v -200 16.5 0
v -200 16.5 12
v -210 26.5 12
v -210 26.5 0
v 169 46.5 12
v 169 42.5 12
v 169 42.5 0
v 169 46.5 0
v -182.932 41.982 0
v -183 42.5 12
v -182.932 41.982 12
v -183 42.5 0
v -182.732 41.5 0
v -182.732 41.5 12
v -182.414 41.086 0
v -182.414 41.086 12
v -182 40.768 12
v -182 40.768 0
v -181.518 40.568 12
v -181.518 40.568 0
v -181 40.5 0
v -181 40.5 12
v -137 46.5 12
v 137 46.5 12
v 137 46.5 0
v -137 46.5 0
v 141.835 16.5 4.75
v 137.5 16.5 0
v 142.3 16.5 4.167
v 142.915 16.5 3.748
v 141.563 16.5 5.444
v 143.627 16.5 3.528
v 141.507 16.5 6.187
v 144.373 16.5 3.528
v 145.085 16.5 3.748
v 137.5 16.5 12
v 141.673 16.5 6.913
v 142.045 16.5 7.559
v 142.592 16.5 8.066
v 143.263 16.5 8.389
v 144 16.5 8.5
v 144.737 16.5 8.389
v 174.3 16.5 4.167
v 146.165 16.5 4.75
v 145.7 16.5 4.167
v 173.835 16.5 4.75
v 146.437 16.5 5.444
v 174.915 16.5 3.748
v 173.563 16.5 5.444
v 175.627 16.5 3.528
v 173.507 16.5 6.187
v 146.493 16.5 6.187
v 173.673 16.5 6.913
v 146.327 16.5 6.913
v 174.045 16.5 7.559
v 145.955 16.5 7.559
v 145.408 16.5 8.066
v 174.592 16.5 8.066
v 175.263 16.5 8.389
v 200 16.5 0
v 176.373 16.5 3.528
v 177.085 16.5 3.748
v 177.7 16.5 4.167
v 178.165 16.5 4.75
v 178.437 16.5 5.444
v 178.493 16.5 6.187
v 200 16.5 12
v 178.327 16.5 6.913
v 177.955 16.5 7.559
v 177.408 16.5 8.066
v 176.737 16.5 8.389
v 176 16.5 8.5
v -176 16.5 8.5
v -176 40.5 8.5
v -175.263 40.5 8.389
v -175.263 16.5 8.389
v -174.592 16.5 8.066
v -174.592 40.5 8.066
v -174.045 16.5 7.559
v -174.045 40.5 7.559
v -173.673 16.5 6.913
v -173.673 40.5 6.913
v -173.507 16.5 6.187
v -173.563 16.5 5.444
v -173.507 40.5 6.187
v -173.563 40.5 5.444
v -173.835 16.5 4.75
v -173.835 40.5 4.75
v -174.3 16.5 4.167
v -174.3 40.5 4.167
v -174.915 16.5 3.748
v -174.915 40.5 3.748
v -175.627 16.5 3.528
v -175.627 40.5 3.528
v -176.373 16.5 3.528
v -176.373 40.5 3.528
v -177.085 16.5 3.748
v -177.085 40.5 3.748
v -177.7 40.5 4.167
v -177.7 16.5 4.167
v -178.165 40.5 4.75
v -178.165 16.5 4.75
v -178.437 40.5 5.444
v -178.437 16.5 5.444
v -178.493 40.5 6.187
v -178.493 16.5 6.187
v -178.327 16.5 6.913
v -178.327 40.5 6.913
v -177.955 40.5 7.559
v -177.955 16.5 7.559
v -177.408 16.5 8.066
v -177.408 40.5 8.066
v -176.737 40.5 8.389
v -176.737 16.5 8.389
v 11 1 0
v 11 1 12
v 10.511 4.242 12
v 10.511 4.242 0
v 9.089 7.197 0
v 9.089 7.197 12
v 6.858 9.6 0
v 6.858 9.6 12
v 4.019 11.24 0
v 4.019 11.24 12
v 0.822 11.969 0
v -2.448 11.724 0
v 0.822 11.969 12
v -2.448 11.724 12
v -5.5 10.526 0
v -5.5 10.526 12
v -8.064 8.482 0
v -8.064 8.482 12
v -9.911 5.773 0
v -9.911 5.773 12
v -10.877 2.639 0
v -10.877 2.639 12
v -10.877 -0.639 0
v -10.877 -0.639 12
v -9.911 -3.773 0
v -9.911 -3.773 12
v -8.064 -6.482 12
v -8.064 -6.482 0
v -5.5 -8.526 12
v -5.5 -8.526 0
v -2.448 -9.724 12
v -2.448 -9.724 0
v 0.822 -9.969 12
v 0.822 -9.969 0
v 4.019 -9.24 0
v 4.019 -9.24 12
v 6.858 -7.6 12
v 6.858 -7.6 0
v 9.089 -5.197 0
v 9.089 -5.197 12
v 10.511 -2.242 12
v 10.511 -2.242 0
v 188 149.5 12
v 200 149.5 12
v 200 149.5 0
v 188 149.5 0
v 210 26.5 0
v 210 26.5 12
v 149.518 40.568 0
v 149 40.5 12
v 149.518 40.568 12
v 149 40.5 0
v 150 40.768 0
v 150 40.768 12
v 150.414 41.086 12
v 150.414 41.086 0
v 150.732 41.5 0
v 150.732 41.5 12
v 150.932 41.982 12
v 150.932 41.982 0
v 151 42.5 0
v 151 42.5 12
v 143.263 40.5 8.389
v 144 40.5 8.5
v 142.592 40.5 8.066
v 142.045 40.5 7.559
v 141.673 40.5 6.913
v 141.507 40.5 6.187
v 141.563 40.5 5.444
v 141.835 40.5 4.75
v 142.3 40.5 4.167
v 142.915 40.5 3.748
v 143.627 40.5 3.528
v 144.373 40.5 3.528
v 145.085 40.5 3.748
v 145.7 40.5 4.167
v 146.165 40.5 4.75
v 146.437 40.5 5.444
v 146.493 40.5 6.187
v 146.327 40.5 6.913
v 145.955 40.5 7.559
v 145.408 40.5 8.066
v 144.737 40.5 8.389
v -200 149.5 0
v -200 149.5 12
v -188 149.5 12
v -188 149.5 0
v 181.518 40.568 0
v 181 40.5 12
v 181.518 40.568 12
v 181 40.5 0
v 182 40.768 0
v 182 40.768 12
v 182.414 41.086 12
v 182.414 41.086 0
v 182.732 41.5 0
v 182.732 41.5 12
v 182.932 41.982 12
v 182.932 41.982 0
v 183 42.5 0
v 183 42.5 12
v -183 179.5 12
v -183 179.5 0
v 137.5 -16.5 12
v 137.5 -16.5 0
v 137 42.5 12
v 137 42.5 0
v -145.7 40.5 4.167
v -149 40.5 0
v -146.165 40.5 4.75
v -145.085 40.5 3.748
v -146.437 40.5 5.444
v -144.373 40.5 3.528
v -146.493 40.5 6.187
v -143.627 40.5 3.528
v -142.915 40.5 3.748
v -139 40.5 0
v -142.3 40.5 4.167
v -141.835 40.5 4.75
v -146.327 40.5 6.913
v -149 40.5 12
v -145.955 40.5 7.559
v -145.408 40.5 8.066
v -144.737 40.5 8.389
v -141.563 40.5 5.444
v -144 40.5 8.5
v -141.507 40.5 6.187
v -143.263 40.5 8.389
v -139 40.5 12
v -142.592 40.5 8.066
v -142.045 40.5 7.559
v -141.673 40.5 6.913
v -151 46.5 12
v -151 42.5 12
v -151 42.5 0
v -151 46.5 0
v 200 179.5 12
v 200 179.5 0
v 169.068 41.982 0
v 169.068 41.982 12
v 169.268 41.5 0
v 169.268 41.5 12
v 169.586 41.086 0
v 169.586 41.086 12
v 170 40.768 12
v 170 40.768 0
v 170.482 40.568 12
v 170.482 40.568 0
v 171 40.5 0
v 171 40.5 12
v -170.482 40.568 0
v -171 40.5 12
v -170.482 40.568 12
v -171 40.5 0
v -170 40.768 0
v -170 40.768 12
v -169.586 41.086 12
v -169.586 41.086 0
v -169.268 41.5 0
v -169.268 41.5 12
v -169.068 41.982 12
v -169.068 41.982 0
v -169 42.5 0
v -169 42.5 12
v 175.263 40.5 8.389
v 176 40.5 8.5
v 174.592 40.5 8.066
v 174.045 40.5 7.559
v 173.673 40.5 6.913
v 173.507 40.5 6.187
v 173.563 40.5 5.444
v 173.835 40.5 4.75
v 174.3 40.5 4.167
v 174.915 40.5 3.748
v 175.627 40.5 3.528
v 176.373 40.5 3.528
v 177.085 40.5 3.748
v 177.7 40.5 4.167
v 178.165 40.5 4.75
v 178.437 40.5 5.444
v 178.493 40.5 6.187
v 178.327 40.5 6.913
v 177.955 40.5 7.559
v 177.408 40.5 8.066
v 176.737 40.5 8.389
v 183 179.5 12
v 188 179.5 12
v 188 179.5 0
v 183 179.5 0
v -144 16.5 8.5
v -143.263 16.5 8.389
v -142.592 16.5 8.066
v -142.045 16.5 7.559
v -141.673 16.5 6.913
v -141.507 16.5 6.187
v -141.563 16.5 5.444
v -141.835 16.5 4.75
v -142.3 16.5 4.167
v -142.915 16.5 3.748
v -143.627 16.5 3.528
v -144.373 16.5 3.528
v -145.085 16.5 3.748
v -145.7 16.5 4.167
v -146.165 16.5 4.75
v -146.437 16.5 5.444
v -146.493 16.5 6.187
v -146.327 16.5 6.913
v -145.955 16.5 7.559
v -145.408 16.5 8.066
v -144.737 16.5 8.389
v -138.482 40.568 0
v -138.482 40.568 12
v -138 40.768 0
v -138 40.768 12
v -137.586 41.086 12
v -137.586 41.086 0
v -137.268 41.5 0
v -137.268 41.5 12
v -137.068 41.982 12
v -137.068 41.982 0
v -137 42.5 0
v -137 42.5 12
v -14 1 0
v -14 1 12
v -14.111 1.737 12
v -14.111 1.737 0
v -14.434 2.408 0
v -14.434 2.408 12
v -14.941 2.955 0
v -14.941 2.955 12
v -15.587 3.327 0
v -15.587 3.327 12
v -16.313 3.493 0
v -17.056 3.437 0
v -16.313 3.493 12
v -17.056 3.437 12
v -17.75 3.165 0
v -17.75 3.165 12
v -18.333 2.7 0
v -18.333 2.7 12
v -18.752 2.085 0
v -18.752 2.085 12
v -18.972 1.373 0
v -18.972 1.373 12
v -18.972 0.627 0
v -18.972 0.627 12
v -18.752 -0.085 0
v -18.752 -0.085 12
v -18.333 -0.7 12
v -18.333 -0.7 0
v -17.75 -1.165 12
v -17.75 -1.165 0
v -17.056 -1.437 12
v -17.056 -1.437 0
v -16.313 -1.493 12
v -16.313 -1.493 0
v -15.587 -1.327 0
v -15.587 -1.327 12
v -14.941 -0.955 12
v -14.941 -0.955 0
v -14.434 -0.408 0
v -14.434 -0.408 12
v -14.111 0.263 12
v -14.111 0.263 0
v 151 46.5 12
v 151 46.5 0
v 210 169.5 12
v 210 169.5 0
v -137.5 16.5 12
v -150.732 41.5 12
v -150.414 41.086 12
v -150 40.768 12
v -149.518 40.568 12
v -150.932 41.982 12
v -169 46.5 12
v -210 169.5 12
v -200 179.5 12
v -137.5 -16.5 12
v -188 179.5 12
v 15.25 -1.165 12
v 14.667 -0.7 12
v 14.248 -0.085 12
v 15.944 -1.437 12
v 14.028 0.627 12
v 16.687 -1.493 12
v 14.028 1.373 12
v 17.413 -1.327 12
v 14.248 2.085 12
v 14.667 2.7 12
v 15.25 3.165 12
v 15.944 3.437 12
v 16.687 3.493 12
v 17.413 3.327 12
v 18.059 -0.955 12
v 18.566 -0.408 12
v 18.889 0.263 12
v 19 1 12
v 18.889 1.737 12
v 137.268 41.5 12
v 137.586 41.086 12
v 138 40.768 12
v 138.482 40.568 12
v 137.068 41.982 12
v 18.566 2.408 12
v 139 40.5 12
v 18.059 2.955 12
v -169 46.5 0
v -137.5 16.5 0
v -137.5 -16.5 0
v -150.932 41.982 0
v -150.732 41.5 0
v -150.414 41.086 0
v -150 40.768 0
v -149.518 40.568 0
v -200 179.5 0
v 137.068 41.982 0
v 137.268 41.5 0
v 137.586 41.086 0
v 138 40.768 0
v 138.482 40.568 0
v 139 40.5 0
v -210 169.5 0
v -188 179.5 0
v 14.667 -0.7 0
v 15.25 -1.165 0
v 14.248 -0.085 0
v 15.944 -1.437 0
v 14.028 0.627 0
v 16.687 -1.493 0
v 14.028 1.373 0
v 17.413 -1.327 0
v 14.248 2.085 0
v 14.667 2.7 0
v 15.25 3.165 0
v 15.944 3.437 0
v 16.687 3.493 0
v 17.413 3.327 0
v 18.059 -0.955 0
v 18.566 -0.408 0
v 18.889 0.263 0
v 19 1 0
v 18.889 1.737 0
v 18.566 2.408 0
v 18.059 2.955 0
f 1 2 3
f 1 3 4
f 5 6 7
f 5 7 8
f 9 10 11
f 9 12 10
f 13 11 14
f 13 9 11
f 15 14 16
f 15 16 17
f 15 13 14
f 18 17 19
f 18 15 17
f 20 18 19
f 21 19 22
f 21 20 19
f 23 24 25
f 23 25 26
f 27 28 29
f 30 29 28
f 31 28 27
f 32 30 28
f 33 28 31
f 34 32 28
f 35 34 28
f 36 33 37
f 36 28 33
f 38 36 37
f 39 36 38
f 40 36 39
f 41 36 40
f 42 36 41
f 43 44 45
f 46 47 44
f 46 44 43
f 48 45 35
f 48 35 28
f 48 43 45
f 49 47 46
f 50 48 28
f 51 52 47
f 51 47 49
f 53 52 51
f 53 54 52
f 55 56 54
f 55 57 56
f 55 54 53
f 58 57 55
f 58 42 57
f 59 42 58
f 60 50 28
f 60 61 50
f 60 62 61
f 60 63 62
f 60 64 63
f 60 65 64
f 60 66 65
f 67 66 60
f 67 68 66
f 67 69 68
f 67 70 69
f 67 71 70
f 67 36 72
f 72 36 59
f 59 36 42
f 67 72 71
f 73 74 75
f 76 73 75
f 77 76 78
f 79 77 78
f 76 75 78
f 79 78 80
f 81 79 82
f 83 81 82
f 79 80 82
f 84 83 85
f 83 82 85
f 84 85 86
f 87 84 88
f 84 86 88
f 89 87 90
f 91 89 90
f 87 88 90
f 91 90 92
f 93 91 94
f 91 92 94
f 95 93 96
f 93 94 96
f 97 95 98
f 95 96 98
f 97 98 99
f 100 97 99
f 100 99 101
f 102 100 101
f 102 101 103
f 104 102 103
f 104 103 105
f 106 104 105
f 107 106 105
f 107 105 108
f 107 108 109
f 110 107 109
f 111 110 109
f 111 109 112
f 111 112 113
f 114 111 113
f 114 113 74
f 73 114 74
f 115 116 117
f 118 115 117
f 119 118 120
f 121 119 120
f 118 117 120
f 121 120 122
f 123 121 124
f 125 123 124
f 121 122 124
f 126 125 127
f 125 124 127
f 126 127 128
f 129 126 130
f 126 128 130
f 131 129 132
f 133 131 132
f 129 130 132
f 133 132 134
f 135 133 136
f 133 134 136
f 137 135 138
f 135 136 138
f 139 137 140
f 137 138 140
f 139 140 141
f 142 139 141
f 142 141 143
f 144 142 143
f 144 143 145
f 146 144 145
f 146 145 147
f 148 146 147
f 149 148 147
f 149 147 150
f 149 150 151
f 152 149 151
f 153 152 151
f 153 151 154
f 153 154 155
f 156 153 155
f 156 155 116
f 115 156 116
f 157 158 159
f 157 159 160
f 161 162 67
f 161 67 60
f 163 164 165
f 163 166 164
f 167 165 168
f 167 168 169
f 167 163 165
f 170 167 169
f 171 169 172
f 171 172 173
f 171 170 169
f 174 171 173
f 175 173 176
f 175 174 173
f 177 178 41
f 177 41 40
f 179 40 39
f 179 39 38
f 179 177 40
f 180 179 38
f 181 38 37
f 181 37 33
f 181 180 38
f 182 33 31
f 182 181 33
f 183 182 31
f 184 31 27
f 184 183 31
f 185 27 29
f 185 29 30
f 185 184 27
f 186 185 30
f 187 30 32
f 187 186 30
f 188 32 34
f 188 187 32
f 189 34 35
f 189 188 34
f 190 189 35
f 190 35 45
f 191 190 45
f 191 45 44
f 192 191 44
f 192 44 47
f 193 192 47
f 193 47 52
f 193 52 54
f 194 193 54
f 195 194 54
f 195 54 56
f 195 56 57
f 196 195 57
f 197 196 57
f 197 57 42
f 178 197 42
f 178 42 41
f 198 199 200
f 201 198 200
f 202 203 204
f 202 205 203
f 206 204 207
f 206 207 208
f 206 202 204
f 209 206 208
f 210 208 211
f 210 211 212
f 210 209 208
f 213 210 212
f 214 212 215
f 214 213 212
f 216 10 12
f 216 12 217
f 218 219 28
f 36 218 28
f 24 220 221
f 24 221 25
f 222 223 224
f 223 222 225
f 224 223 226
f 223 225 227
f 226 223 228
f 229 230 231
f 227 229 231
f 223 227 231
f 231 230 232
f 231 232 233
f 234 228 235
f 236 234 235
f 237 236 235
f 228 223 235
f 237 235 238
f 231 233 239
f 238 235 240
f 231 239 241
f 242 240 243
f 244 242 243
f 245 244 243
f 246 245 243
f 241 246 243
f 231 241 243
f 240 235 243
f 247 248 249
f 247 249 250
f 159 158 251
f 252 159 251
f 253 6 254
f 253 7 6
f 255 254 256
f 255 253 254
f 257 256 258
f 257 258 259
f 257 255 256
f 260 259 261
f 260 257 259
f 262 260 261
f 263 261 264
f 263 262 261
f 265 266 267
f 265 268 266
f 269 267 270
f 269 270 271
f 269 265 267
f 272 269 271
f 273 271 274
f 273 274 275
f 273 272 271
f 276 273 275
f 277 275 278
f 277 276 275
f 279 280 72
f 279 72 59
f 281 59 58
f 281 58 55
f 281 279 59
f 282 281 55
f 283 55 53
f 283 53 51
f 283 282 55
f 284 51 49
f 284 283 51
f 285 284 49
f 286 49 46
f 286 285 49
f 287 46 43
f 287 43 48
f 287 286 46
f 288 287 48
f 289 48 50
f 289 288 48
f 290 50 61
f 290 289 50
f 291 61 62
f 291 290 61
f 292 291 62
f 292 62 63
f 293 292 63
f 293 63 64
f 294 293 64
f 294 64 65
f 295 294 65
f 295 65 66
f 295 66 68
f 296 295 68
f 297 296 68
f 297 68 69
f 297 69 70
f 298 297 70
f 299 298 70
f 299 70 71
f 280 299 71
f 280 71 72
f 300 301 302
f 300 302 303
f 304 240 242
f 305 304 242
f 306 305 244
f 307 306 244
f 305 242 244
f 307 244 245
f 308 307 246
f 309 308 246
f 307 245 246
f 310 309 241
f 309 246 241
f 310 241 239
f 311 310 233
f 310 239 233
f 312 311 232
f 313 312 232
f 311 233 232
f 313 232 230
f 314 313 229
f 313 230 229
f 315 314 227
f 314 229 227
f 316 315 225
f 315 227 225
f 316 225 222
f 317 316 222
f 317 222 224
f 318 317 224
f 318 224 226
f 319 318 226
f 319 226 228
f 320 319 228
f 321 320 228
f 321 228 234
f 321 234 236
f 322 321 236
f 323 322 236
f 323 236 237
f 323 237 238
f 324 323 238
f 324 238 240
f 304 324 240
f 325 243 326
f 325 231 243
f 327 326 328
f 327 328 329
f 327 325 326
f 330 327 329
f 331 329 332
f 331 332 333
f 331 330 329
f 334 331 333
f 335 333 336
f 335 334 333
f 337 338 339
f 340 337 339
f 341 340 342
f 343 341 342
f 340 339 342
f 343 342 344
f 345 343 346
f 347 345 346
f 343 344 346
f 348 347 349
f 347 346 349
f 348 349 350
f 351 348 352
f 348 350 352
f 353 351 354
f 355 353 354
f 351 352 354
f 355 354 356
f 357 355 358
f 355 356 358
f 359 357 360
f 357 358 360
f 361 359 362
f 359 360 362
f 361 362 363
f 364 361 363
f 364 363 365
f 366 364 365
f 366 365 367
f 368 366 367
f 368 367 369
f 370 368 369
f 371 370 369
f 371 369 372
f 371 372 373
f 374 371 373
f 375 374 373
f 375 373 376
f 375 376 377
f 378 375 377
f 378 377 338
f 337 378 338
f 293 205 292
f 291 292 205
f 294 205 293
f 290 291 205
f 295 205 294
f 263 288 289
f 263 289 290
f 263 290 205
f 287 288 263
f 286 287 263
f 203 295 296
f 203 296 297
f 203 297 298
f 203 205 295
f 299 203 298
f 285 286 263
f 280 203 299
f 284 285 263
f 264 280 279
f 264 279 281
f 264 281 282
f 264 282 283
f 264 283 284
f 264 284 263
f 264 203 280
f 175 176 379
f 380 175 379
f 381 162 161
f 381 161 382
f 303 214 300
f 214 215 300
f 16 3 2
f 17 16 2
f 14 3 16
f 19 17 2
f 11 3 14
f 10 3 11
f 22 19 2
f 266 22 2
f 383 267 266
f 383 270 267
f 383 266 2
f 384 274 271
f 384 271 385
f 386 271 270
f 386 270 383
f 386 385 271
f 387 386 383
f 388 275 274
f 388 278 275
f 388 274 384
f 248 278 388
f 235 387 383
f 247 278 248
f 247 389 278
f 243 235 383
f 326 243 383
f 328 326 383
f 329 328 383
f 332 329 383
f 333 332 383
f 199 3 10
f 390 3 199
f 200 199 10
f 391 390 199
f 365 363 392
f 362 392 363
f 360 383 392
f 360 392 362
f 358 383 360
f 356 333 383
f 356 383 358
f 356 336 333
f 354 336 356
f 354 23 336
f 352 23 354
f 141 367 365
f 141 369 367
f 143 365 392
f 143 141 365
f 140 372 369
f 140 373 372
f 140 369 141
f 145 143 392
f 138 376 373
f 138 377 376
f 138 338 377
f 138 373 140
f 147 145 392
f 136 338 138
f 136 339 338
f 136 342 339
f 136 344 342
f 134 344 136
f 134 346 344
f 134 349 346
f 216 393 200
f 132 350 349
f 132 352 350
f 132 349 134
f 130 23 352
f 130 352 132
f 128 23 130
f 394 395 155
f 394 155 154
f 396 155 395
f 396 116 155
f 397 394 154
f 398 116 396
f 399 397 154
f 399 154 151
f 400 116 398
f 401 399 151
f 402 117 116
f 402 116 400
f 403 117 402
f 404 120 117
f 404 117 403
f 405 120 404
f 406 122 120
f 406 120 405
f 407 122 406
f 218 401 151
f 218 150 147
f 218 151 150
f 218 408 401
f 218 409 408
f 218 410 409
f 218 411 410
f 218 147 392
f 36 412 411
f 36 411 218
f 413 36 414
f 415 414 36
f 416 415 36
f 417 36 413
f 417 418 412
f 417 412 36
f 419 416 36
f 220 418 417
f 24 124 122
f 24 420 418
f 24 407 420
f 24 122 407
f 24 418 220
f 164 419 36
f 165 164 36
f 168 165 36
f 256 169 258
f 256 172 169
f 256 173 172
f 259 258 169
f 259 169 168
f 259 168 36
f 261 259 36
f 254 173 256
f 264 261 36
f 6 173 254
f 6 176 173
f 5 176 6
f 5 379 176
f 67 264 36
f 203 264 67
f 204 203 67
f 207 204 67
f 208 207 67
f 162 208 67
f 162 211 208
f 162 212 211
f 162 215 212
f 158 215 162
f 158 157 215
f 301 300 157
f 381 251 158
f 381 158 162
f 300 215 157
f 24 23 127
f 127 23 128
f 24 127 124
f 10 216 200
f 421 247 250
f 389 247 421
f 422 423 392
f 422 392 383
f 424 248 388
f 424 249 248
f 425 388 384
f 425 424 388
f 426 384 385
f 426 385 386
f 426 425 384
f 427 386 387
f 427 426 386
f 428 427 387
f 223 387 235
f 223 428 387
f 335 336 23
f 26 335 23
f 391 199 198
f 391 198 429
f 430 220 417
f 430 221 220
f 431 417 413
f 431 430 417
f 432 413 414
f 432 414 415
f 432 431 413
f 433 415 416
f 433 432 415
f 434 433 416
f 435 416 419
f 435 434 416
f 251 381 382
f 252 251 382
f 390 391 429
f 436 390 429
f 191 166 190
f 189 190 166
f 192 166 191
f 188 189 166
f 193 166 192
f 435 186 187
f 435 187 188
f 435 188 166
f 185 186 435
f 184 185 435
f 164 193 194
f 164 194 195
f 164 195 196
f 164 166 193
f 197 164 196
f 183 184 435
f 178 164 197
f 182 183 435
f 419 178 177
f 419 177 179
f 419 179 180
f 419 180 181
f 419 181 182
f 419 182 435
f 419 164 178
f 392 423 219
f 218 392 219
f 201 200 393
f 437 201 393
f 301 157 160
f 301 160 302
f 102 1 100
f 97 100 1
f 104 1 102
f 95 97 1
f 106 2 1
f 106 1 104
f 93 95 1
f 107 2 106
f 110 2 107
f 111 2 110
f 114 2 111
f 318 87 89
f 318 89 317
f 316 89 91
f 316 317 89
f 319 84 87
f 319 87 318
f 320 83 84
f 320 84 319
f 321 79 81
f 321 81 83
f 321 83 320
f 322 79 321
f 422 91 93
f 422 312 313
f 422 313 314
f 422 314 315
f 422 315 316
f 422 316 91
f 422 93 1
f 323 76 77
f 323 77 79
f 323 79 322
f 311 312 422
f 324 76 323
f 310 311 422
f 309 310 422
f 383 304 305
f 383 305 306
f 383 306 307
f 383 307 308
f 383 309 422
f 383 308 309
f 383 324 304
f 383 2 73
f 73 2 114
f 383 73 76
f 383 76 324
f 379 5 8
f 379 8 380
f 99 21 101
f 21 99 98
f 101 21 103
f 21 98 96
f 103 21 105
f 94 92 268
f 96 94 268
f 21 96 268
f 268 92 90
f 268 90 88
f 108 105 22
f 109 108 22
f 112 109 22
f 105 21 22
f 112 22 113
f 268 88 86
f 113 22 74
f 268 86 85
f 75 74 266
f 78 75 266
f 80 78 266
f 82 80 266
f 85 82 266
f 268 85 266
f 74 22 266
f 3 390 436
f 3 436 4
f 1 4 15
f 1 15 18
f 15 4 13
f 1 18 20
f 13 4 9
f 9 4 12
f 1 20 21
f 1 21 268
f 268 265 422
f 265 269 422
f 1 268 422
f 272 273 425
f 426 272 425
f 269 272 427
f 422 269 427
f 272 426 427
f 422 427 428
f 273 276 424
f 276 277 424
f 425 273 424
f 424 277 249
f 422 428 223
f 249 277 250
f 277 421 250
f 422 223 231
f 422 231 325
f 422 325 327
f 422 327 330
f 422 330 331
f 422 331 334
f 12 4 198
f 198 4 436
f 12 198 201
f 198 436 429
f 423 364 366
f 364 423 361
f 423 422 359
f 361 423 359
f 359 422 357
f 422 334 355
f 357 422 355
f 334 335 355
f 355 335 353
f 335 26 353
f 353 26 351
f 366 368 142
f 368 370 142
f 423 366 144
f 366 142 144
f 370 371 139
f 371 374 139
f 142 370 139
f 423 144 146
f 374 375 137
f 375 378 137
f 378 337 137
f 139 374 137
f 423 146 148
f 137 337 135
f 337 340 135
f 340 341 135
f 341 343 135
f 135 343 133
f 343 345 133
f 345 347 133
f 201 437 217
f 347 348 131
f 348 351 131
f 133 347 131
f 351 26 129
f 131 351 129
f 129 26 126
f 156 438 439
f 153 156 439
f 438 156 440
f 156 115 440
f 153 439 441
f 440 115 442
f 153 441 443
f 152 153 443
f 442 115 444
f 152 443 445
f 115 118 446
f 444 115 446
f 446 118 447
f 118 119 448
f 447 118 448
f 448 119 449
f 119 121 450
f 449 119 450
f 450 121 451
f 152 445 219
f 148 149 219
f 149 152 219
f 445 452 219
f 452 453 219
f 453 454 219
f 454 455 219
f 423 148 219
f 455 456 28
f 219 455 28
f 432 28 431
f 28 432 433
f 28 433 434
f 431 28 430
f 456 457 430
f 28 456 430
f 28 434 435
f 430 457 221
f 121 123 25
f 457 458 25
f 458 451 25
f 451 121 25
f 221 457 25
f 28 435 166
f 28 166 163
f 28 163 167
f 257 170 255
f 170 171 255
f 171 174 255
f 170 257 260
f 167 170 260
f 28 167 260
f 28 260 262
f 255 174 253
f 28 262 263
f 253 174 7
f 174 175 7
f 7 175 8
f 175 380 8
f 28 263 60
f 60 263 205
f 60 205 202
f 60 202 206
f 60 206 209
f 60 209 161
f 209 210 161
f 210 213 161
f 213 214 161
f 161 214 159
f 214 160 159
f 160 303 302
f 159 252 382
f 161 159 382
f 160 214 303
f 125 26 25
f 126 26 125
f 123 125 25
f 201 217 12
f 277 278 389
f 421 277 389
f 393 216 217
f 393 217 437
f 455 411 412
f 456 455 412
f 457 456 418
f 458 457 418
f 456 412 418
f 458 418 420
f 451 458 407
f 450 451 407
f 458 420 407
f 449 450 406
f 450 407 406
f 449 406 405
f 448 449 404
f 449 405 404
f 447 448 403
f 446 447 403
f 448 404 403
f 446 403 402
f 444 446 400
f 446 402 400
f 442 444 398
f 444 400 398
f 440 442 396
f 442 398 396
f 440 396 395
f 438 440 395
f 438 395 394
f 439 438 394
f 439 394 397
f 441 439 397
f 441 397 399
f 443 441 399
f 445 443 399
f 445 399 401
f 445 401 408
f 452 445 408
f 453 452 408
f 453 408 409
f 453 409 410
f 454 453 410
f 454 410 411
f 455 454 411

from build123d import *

# Parameters (mm, degrees)
SKETCH1_W            = 275
SKETCH1_H            = 33
BOSS_EXTRUDE1_DEPTH  = 12
CUT_EXTRUDE1_REACH   = 141.005
SKETCH2_R            = 11
SKETCH2_R_2          = 2.5
BOSS_EXTRUDE2_DEPTH  = 12
CUT_EXTRUDE2_REACH   = 250.863
SKETCH4_R            = 2.5
CUT_EXTRUDE3_REACH   = 278.522
SKETCH5_W            = 14
SKETCH5_H            = 6
FILLET1_R            = 2
FILLET1_OF_MIRROR2_R = 2
CHAMFER1_SIZE        = 10
CUT_EXTRUDE4_REACH   = 278.522
SKETCH6_W            = 12
SKETCH6_H            = 30
CHAMFER2_SIZE        = 10


with BuildPart() as part:
    # Sketch1 → Boss-Extrude1 (new body)
    with BuildSketch(Plane.XY):
        Rectangle(SKETCH1_W, SKETCH1_H)
    extrude(amount=BOSS_EXTRUDE1_DEPTH)

    # Sketch2 → Cut-Extrude1 (cut, up to next)
    with BuildSketch(Plane.XY.offset(12), mode=Mode.PRIVATE) as cut_extrude1_sk1:
        with Locations((0, 1)):
            Circle(SKETCH2_R)
    cut_extrude1_tool1 = extrude(cut_extrude1_sk1.sketch, amount=-CUT_EXTRUDE1_REACH, mode=Mode.PRIVATE) & part.part
    # Sketch2 → Cut-Extrude1 (cut, up to next)
    with BuildSketch(Plane.XY.offset(12), mode=Mode.PRIVATE) as cut_extrude1_sk2:
        with Locations((-16.5, 1)):
            Circle(SKETCH2_R_2)
    cut_extrude1_tool2 = extrude(cut_extrude1_sk2.sketch, amount=-CUT_EXTRUDE1_REACH, mode=Mode.PRIVATE) & part.part
    # Sketch2 → Cut-Extrude1 (cut, up to next)
    with BuildSketch(Plane.XY.offset(12), mode=Mode.PRIVATE) as cut_extrude1_sk3:
        with Locations((16.5, 1)):
            Circle(SKETCH2_R_2)
    cut_extrude1_tool3 = extrude(cut_extrude1_sk3.sketch, amount=-CUT_EXTRUDE1_REACH, mode=Mode.PRIVATE) & part.part
    add(cut_extrude1_tool1.solids().sort_by_distance((0, 1, 12))[0], mode=Mode.SUBTRACT)
    add(cut_extrude1_tool2.solids().sort_by_distance((-16.5, 1, 12))[0], mode=Mode.SUBTRACT)
    add(cut_extrude1_tool3.solids().sort_by_distance((16.5, 1, 12))[0], mode=Mode.SUBTRACT)

    # Sketch3 → Boss-Extrude2 (add)
    with BuildSketch(Plane.XY.offset(12)):
        Polygon((-210, 16.5), (210, 16.5), (210, 179.5), (183, 179.5), (183, 46.5), (-183, 46.5), (-183, 179.5), (-210, 179.5), align=None)
    extrude(amount=-BOSS_EXTRUDE2_DEPTH)

    # Sketch4 → Cut-Extrude2 (cut, up to next)
    with BuildSketch(Plane(origin=(0, 46.5, 0), x_dir=(1, 0, 0), z_dir=(0, 1, 0)), mode=Mode.PRIVATE) as cut_extrude2_sk1:
        with Locations(Location((-144, -6, 0), (0, 0, 270))):
            Circle(SKETCH4_R)
    cut_extrude2_tool1 = extrude(cut_extrude2_sk1.sketch, amount=-CUT_EXTRUDE2_REACH, mode=Mode.PRIVATE) & part.part
    # Sketch4 → Cut-Extrude2 (cut, up to next)
    with BuildSketch(Plane(origin=(0, 46.5, 0), x_dir=(1, 0, 0), z_dir=(0, 1, 0)), mode=Mode.PRIVATE) as cut_extrude2_sk2:
        with Locations(Location((-176, -6, 0), (0, 0, 270))):
            Circle(SKETCH4_R)
    cut_extrude2_tool2 = extrude(cut_extrude2_sk2.sketch, amount=-CUT_EXTRUDE2_REACH, mode=Mode.PRIVATE) & part.part
    cut_extrude2_1 = cut_extrude2_tool1.solids().sort_by_distance((-144, 46.5, 6))[0]
    add(cut_extrude2_1, mode=Mode.SUBTRACT)
    cut_extrude2_2 = cut_extrude2_tool2.solids().sort_by_distance((-176, 46.5, 6))[0]
    add(cut_extrude2_2, mode=Mode.SUBTRACT)
    cut_extrude2 = cut_extrude2_1 + cut_extrude2_2  # Cut-Extrude2 as one shape, for the pattern or mirror that repeats it

    # Mirror1: Cut-Extrude2 across plane
    add(cut_extrude2.mirror(Plane(origin=(0, 0, 0), x_dir=(0, 0, 1), z_dir=(1, 0, 0))), mode=Mode.SUBTRACT)

    # Sketch5 → Cut-Extrude3 (cut, up to next)
    with BuildSketch(Plane.XY.offset(12), mode=Mode.PRIVATE) as cut_extrude3_sk1:
        with Locations((-176, 43.5)):
            Rectangle(SKETCH5_W, SKETCH5_H)
    cut_extrude3_tool1 = extrude(cut_extrude3_sk1.sketch, amount=-CUT_EXTRUDE3_REACH, mode=Mode.PRIVATE) & part.part
    # Sketch5 → Cut-Extrude3 (cut, up to next)
    with BuildSketch(Plane.XY.offset(12), mode=Mode.PRIVATE) as cut_extrude3_sk2:
        with Locations((-144, 43.5)):
            Rectangle(SKETCH5_W, SKETCH5_H)
    cut_extrude3_tool2 = extrude(cut_extrude3_sk2.sketch, amount=-CUT_EXTRUDE3_REACH, mode=Mode.PRIVATE) & part.part
    cut_extrude3_1 = cut_extrude3_tool1.solids().sort_by_distance((-176, 43.5, 12))[0]
    add(cut_extrude3_1, mode=Mode.SUBTRACT)
    cut_extrude3_2 = cut_extrude3_tool2.solids().sort_by_distance((-144, 43.5, 12))[0]
    add(cut_extrude3_2, mode=Mode.SUBTRACT)
    cut_extrude3 = cut_extrude3_1 + cut_extrude3_2  # Cut-Extrude3 as one shape, for the pattern or mirror that repeats it

    # Fillet1
    fillet1_edges = [part.edges().sort_by_distance(p)[0] for p in [
        (-169, 40.5, 6),
        (-183, 40.5, 6),
        (-137, 40.5, 6),
        (-151, 40.5, 6),
    ]]
    fillet(fillet1_edges, radius=FILLET1_R)

    # Mirror2: Cut-Extrude3 across plane
    add(cut_extrude3.mirror(Plane(origin=(0, 0, 0), x_dir=(0, 0, 1), z_dir=(1, 0, 0))), mode=Mode.SUBTRACT)

    # Fillet1 of Mirror2
    fillet1_of_mirror2_edges = [part.edges().sort_by_distance(p)[0] for p in [
        (169, 40.5, 6),
        (183, 40.5, 6),
        (137, 40.5, 6),
        (151, 40.5, 6),
    ]]
    fillet(fillet1_of_mirror2_edges, radius=FILLET1_OF_MIRROR2_R)

    # Chamfer1
    chamfer1_edges = [part.edges().sort_by_distance(p)[0] for p in [
        (210, 16.5, 6),
        (-210, 16.5, 6),
    ]]
    chamfer(chamfer1_edges, length=CHAMFER1_SIZE)

    # Sketch6 → Cut-Extrude4 (cut, up to next)
    with BuildSketch(Plane.XY.offset(12), mode=Mode.PRIVATE) as cut_extrude4_sk1:
        with Locations((-194, 164.5)):
            Rectangle(SKETCH6_W, SKETCH6_H)
    cut_extrude4_tool1 = extrude(cut_extrude4_sk1.sketch, amount=-CUT_EXTRUDE4_REACH, mode=Mode.PRIVATE) & part.part
    cut_extrude4 = cut_extrude4_tool1.solids().sort_by_distance((-194, 164.5, 12))[0]
    add(cut_extrude4, mode=Mode.SUBTRACT)

    # Mirror3: Cut-Extrude4 across plane
    add(cut_extrude4.mirror(Plane(origin=(0, 0, 0), x_dir=(0, 0, 1), z_dir=(1, 0, 0))), mode=Mode.SUBTRACT)

    # Chamfer2
    chamfer2_edges = [part.edges().sort_by_distance(p)[0] for p in [
        (210, 179.5, 6),
        (-210, 179.5, 6),
    ]]
    chamfer(chamfer2_edges, length=CHAMFER2_SIZE - 0.0001)  # a hair under: the kernel refuses the full size


solid = part.part
